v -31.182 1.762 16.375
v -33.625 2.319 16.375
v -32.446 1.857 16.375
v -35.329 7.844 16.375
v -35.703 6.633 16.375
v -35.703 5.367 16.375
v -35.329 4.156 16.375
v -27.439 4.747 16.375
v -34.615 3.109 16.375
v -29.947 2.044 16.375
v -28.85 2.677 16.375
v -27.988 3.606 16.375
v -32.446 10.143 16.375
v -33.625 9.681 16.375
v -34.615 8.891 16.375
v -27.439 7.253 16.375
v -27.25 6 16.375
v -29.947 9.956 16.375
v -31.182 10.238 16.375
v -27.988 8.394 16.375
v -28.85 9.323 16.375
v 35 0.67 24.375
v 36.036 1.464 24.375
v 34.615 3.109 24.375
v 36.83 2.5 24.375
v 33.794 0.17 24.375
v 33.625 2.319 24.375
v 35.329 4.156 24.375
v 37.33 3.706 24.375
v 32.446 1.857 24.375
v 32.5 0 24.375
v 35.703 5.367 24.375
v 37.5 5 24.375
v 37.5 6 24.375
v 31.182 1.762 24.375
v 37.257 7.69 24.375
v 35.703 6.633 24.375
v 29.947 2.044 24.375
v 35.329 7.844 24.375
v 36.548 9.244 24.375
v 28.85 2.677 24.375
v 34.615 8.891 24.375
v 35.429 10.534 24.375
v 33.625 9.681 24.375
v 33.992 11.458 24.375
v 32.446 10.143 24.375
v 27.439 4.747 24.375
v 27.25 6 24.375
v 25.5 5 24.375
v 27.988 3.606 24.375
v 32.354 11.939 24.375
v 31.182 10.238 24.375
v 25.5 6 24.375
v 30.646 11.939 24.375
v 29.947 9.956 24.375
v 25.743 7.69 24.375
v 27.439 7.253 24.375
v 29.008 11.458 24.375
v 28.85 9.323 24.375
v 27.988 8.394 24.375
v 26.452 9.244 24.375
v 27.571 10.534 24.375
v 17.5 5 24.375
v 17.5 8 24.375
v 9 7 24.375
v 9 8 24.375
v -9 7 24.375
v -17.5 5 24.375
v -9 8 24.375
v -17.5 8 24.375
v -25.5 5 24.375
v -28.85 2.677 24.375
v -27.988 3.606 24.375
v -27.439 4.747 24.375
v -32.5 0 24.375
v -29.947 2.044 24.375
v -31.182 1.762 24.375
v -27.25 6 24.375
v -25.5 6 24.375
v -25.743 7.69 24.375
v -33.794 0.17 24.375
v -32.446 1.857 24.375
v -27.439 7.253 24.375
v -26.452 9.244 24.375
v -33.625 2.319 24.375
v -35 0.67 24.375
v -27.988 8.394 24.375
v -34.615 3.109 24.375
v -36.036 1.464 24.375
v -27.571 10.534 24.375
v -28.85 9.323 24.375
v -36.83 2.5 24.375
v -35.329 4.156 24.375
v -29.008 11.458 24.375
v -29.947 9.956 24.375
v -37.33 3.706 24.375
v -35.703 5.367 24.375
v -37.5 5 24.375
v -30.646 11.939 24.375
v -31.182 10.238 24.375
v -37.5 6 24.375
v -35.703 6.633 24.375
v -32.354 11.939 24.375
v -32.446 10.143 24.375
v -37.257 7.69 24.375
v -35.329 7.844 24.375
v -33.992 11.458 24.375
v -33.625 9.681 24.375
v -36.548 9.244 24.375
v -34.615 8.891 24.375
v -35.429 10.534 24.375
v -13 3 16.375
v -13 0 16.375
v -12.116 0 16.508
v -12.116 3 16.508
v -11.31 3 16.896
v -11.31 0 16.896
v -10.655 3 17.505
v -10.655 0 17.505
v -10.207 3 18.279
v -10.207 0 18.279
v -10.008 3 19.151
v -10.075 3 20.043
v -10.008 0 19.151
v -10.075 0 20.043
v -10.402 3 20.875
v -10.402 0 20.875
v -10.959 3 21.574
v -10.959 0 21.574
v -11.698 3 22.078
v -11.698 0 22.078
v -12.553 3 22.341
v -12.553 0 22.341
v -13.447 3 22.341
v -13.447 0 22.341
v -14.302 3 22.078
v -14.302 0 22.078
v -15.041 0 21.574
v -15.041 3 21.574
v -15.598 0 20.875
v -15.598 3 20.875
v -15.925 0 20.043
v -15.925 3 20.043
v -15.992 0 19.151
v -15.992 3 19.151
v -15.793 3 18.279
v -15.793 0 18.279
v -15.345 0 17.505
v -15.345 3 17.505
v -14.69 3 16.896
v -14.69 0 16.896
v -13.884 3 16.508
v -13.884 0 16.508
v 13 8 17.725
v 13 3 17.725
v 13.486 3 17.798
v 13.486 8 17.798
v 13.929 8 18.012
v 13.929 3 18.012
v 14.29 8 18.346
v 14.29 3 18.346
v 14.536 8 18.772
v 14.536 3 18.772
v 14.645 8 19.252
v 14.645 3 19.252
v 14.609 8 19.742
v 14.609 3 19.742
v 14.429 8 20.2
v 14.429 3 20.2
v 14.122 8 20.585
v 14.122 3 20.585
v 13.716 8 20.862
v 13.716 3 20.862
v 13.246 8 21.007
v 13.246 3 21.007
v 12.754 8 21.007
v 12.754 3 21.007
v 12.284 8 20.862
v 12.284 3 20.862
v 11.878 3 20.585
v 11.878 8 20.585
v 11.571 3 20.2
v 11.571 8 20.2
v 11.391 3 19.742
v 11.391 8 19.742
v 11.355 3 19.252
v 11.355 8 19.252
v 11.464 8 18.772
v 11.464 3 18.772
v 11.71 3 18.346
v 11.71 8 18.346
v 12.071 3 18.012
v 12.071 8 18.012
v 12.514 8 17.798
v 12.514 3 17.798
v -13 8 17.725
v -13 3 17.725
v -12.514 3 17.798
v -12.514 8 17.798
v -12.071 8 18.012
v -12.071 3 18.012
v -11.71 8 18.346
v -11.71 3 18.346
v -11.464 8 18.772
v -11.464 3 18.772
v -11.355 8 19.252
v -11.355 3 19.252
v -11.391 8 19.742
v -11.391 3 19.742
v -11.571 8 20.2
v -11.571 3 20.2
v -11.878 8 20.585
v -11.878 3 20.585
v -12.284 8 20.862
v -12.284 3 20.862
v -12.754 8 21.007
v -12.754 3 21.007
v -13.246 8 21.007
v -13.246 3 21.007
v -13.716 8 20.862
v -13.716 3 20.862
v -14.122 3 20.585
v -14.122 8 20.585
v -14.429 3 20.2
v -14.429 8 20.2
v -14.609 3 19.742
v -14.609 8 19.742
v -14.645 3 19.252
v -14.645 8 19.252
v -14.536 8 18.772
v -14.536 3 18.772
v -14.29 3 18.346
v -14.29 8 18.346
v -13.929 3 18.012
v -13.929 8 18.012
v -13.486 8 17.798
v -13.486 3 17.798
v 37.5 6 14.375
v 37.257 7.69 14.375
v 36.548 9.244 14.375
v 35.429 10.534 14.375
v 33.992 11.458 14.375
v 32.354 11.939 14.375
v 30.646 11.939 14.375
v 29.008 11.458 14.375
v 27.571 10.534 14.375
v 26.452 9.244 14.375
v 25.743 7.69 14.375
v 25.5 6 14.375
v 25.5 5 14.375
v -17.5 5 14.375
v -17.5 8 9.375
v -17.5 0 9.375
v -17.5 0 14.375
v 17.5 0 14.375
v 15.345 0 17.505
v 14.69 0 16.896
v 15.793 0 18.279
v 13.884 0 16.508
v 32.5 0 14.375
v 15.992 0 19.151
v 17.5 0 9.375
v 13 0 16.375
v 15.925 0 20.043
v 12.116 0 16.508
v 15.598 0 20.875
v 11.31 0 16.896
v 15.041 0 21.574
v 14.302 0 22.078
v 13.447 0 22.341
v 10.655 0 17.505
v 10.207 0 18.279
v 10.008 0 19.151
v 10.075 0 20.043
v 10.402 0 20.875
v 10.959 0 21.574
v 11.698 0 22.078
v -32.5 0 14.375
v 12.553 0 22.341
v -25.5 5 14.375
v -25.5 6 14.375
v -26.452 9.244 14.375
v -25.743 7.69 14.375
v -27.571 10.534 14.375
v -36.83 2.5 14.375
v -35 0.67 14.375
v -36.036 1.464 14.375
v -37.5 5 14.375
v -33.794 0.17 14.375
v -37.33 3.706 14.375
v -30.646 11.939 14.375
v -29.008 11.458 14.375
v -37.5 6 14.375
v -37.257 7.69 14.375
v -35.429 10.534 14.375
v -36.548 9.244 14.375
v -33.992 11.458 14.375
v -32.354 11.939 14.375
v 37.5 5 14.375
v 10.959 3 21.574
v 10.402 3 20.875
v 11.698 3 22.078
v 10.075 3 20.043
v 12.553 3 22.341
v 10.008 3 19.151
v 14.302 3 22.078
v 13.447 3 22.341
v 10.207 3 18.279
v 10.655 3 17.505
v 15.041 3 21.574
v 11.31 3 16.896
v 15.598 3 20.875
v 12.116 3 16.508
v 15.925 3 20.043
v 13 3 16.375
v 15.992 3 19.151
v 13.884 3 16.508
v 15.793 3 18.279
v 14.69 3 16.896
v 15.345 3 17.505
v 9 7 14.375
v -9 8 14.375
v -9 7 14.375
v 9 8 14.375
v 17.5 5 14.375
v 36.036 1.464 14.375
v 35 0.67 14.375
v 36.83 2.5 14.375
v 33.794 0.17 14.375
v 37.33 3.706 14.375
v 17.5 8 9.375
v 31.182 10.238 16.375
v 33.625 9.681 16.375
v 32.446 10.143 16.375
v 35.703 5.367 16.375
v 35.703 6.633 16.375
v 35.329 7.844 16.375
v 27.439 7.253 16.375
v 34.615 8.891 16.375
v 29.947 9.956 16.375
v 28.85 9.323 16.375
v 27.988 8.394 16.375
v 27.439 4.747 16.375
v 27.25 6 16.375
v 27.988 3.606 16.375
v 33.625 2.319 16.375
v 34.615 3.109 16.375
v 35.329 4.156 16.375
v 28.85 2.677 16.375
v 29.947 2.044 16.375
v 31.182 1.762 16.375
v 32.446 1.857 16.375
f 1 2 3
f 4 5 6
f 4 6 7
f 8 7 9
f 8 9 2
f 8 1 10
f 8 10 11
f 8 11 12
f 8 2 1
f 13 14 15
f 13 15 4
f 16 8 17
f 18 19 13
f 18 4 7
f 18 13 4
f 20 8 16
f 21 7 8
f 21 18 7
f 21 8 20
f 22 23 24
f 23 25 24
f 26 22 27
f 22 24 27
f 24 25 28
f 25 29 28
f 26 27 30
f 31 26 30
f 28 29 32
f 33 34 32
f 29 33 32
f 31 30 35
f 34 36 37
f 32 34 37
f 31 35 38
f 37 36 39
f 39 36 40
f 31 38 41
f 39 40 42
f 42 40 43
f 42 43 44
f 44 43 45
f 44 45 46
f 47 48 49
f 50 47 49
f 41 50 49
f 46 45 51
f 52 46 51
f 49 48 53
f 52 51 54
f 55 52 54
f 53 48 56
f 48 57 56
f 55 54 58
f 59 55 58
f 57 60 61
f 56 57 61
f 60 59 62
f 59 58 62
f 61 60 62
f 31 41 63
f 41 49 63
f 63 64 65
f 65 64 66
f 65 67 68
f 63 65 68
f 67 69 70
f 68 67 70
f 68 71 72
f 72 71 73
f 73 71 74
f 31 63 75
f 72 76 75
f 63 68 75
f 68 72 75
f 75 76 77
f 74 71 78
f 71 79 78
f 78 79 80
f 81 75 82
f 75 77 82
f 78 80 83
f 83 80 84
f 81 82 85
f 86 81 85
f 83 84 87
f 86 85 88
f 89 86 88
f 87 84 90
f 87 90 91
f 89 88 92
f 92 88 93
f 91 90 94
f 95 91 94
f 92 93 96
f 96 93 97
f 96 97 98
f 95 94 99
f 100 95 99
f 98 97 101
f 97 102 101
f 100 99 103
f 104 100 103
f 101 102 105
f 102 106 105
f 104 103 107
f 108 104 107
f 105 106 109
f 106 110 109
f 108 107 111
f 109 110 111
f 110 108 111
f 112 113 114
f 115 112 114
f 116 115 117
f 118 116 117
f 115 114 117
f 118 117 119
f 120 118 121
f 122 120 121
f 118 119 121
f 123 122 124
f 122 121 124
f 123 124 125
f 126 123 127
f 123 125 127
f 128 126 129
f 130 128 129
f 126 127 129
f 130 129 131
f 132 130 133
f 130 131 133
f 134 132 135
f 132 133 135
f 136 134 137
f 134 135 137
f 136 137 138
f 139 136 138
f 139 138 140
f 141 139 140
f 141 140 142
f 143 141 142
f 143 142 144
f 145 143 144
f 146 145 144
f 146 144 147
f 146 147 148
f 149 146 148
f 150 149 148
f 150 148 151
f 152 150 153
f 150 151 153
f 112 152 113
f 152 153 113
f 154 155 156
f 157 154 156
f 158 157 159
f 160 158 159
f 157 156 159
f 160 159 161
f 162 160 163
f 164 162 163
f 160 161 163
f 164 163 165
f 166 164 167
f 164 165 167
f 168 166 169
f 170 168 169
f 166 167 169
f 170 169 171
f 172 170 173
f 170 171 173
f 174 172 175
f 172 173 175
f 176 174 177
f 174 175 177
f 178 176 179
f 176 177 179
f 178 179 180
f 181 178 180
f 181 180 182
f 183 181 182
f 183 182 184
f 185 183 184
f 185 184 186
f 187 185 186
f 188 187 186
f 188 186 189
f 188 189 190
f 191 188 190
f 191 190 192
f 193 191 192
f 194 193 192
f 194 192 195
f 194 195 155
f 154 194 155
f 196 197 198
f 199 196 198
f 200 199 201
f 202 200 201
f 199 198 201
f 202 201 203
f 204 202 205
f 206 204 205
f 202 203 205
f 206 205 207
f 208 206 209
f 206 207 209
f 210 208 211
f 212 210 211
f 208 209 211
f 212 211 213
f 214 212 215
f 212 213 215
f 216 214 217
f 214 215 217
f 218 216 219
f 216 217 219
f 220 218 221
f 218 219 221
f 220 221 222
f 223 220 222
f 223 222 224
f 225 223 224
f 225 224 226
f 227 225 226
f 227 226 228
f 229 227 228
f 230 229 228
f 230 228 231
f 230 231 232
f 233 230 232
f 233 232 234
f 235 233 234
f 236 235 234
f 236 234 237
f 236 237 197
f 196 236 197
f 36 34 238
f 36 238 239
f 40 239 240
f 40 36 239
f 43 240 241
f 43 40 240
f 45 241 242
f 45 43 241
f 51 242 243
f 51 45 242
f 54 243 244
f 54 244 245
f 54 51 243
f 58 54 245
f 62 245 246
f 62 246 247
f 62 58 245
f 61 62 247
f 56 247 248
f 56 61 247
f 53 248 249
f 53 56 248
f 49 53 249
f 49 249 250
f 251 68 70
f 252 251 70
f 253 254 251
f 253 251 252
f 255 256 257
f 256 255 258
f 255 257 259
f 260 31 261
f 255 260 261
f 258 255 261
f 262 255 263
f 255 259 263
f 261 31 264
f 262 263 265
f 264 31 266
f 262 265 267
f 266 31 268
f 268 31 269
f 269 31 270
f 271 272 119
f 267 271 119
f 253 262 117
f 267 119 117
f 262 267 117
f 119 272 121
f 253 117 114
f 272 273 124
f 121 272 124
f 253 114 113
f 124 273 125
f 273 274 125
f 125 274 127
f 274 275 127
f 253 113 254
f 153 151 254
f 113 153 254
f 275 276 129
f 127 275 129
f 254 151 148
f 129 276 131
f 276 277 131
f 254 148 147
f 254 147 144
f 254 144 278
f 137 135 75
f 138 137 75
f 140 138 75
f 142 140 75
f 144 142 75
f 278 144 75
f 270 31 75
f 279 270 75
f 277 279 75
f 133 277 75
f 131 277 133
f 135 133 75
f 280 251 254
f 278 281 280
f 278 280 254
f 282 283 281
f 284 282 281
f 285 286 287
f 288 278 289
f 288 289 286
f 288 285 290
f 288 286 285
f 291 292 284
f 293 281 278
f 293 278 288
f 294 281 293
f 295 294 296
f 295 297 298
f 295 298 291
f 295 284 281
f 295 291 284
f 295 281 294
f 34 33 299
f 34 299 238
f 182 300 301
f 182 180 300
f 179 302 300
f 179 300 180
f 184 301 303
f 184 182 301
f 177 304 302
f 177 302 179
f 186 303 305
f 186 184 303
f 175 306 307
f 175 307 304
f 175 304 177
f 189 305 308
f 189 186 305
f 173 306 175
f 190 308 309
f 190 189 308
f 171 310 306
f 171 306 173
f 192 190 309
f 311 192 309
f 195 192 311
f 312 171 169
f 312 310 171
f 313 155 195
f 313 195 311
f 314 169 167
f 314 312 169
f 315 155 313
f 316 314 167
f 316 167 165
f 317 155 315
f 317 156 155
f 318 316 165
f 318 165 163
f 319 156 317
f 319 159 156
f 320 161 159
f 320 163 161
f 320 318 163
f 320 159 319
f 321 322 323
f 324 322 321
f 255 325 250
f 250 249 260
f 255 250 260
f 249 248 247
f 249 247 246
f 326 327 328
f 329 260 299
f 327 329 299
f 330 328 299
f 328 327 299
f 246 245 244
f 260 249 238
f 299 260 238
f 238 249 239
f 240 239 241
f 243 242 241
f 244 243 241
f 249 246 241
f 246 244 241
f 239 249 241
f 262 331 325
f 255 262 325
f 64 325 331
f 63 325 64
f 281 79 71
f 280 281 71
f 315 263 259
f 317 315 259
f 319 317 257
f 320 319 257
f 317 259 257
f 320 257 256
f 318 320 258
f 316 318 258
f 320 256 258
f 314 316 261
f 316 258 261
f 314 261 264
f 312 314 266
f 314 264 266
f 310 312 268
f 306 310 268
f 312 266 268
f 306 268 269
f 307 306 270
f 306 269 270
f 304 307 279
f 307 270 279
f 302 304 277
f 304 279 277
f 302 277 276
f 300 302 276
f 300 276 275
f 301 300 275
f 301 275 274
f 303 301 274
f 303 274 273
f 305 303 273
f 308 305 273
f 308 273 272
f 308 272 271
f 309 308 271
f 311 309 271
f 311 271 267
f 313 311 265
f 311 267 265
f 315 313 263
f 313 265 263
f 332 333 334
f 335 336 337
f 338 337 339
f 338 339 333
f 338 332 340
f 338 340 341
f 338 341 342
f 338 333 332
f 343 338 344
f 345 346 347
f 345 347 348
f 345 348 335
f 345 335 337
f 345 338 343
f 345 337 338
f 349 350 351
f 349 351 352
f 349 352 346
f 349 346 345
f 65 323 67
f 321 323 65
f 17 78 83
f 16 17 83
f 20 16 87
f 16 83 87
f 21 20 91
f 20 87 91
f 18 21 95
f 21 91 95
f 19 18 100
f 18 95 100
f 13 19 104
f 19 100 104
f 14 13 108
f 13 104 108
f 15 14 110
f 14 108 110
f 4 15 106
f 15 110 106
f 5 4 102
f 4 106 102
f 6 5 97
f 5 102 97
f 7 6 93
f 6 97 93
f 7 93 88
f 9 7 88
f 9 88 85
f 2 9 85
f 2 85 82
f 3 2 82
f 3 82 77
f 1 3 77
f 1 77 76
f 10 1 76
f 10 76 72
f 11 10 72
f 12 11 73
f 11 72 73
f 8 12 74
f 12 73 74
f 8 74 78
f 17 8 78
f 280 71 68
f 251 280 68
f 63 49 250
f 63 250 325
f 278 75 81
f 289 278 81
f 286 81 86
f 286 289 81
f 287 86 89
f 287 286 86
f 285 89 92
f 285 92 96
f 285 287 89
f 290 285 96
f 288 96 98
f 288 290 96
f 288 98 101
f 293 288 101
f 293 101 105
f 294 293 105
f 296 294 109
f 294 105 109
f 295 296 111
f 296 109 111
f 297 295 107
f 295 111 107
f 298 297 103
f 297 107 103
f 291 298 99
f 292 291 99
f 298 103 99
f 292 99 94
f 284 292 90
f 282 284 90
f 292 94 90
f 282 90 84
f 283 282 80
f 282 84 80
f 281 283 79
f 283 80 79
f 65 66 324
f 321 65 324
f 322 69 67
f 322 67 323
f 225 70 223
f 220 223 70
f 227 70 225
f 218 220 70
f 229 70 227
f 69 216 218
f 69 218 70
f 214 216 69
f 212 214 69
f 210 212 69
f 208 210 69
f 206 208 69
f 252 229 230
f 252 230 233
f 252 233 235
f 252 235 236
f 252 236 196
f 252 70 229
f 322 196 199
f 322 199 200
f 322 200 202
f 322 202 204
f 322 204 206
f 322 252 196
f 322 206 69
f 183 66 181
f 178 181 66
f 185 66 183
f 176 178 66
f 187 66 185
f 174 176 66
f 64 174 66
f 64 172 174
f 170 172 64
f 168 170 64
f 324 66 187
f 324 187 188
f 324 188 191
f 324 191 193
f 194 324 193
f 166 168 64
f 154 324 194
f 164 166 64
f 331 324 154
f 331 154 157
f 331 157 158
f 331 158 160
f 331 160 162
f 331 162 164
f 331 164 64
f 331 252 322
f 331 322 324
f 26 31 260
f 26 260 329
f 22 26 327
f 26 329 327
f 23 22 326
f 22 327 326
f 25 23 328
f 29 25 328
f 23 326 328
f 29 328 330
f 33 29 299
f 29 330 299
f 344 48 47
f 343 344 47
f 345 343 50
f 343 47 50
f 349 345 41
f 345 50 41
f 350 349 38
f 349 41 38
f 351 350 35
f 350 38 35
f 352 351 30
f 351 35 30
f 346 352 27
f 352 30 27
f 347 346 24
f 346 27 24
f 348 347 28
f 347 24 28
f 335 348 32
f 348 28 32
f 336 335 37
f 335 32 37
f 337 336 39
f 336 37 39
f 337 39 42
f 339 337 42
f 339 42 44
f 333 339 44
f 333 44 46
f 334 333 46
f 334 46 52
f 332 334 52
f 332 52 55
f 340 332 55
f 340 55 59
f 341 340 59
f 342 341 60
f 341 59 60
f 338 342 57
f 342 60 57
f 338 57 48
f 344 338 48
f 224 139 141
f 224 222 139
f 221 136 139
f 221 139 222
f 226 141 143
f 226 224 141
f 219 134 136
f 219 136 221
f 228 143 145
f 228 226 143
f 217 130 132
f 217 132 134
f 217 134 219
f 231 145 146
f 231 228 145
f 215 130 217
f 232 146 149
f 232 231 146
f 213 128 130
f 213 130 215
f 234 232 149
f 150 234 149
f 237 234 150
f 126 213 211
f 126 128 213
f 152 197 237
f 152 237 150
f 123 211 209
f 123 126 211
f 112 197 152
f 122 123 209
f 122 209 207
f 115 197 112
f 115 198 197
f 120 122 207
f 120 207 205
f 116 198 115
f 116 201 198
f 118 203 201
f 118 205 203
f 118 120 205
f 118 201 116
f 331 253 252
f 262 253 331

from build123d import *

# Parameters (mm, degrees)
SKETCH2_W           = 17
SKETCH2_H           = 2.75
BOSS_EXTRUDE1_DEPTH = 8
BOSS_EXTRUDE3_DEPTH = 8
SKETCH5_R           = 3
CUT_EXTRUDE1_DEPTH  = 3
SKETCH6_R           = 1.65
CUT_EXTRUDE2_DEPTH  = 8
FILLET14_R          = 2
FILLET15_R          = 2
FILLET16_R          = 2
SKETCH7_W           = 18
SKETCH7_H           = 10
CUT_EXTRUDE3_DEPTH  = 1
FILLET18_R          = 1.4
BOSS_EXTRUDE4_DEPTH = 10
SKETCH10_R          = 4.25
CUT_EXTRUDE4_DEPTH  = 8
FILLET17_R          = 2
FILLET19_R          = 5
SKETCH11_W          = 35
SKETCH11_H          = 13.55262527
CUT_EXTRUDE5_DEPTH  = 46.43556564


with BuildPart() as part:
    # Sketch2 → Boss-Extrude1 (new body)
    with BuildSketch(Plane(origin=(0, 0, 0), x_dir=(1, 0, 0), z_dir=(0, 1, 0))):
        Rectangle(SKETCH2_W, SKETCH2_H)
    extrude(amount=BOSS_EXTRUDE1_DEPTH)

    # Sketch3 → Boss-Extrude3 (add)
    with BuildSketch(Plane(origin=(0, 0, 0), x_dir=(1, 0, 0), z_dir=(0, 1, 0))):
        Polygon((4, -9.375), (17.5, -9.375), (17.5, -24.375), (-17.5, -24.375), (-17.5, -9.375), (-4, -9.375), (-4, -1.375), (4, -1.375), align=None)
    extrude(amount=BOSS_EXTRUDE3_DEPTH)

    # Sketch5 → Cut-Extrude1 (cut)
    with BuildSketch(Plane.XZ):
        with Locations(Location((13, 19.375, 0), (0, 0, 270))):
            Circle(SKETCH5_R)
        with Locations(Location((-13, 19.375, 0), (0, 0, 270))):
            Circle(SKETCH5_R)
    extrude(amount=-CUT_EXTRUDE1_DEPTH, mode=Mode.SUBTRACT)

    # Sketch6 → Cut-Extrude2 (cut)
    with BuildSketch(Plane.XZ):
        with Locations(Location((-13, 19.375, 0), (0, 0, 270))):
            Circle(SKETCH6_R)
        with Locations(Location((13, 19.375, 0), (0, 0, 270))):
            Circle(SKETCH6_R)
    extrude(amount=-CUT_EXTRUDE2_DEPTH, mode=Mode.SUBTRACT)

    # Fillet14
    fillet14_edges = [part.edges().sort_by_distance(p)[0] for p in [
        (-4, 4, 9.375),
    ]]
    fillet(fillet14_edges, radius=FILLET14_R)

    # Fillet15
    fillet15_edges = [part.edges().sort_by_distance(p)[0] for p in [
        (4, 4, 9.375),
    ]]
    fillet(fillet15_edges, radius=FILLET15_R)

    # Fillet16
    fillet16_edges = [part.edges().sort_by_distance(p)[0] for p in [
        (-4, 4, 1.375),
    ]]
    fillet(fillet16_edges, radius=FILLET16_R)

    # Sketch7 → Cut-Extrude3 (cut)
    with BuildSketch(Plane(origin=(0, 8, 0), x_dir=(1, 0, 0), z_dir=(0, 1, 0))):
        with Locations((0, -19.375)):
            Rectangle(SKETCH7_W, SKETCH7_H)
    extrude(amount=-CUT_EXTRUDE3_DEPTH, mode=Mode.SUBTRACT)

    # Fillet18
    fillet18_edges = [part.edges().sort_by_distance(p)[0] for p in [
        (8.5, 8, 0),
        (-8.5, 8, 0),
        (8.5, 0, 0),
        (-8.5, 0, 0),
    ]]
    fillet(fillet18_edges, radius=FILLET18_R)

    # Sketch9 → Boss-Extrude4 (add)
    with BuildSketch(Plane.XY.offset(24.375)):
        with BuildLine():
            Line((-17.5, 0), (-37.5, 0))
            Line((-37.5, 0), (-37.5, 6))
            ThreePointArc((-37.5, 6), (-31.5, 12), (-25.5, 6))
            Line((-25.5, 6), (-25.5, 5))
            Line((-25.5, 5), (-17.5, 5))
            Line((-17.5, 5), (-17.5, 0))
        make_face()
        with BuildLine():
            Line((25.5, 6), (25.5, 5))
            Line((25.5, 5), (17.5, 5))
            Line((17.5, 5), (17.5, 0))
            Line((17.5, 0), (37.5, 0))
            Line((37.5, 0), (37.5, 6))
            ThreePointArc((37.5, 6), (31.5, 12), (25.5, 6))
        make_face()
    extrude(amount=-BOSS_EXTRUDE4_DEPTH)

    # Sketch10 → Cut-Extrude4 (cut)
    with BuildSketch(Plane.XY.offset(24.375)):
        with Locations((-31.5, 6)):
            Circle(SKETCH10_R)
        with Locations(Location((31.5, 6, 0), (0, 0, 180))):
            Circle(SKETCH10_R)
    extrude(amount=-CUT_EXTRUDE4_DEPTH, mode=Mode.SUBTRACT)

    # Fillet17
    fillet17_edges = [part.edges().sort_by_distance(p)[0] for p in [
        (4, 4, 1.375),
    ]]
    fillet(fillet17_edges, radius=FILLET17_R)

    # Fillet19
    fillet19_edges = [part.edges().sort_by_distance(p)[0] for p in [
        (-37.5, 0, 19.375),
        (37.5, 0, 19.375),
    ]]
    fillet(fillet19_edges, radius=FILLET19_R)

    # Sketch11 → Cut-Extrude5 (cut, through all)
    with BuildSketch(Plane(origin=(0, 8, 0), x_dir=(1, 0, 0), z_dir=(0, 1, 0))):
        with Locations((0, -2.598687365)):
            Rectangle(SKETCH11_W, SKETCH11_H)
    extrude(amount=-CUT_EXTRUDE5_DEPTH, mode=Mode.SUBTRACT)


solid = part.part
